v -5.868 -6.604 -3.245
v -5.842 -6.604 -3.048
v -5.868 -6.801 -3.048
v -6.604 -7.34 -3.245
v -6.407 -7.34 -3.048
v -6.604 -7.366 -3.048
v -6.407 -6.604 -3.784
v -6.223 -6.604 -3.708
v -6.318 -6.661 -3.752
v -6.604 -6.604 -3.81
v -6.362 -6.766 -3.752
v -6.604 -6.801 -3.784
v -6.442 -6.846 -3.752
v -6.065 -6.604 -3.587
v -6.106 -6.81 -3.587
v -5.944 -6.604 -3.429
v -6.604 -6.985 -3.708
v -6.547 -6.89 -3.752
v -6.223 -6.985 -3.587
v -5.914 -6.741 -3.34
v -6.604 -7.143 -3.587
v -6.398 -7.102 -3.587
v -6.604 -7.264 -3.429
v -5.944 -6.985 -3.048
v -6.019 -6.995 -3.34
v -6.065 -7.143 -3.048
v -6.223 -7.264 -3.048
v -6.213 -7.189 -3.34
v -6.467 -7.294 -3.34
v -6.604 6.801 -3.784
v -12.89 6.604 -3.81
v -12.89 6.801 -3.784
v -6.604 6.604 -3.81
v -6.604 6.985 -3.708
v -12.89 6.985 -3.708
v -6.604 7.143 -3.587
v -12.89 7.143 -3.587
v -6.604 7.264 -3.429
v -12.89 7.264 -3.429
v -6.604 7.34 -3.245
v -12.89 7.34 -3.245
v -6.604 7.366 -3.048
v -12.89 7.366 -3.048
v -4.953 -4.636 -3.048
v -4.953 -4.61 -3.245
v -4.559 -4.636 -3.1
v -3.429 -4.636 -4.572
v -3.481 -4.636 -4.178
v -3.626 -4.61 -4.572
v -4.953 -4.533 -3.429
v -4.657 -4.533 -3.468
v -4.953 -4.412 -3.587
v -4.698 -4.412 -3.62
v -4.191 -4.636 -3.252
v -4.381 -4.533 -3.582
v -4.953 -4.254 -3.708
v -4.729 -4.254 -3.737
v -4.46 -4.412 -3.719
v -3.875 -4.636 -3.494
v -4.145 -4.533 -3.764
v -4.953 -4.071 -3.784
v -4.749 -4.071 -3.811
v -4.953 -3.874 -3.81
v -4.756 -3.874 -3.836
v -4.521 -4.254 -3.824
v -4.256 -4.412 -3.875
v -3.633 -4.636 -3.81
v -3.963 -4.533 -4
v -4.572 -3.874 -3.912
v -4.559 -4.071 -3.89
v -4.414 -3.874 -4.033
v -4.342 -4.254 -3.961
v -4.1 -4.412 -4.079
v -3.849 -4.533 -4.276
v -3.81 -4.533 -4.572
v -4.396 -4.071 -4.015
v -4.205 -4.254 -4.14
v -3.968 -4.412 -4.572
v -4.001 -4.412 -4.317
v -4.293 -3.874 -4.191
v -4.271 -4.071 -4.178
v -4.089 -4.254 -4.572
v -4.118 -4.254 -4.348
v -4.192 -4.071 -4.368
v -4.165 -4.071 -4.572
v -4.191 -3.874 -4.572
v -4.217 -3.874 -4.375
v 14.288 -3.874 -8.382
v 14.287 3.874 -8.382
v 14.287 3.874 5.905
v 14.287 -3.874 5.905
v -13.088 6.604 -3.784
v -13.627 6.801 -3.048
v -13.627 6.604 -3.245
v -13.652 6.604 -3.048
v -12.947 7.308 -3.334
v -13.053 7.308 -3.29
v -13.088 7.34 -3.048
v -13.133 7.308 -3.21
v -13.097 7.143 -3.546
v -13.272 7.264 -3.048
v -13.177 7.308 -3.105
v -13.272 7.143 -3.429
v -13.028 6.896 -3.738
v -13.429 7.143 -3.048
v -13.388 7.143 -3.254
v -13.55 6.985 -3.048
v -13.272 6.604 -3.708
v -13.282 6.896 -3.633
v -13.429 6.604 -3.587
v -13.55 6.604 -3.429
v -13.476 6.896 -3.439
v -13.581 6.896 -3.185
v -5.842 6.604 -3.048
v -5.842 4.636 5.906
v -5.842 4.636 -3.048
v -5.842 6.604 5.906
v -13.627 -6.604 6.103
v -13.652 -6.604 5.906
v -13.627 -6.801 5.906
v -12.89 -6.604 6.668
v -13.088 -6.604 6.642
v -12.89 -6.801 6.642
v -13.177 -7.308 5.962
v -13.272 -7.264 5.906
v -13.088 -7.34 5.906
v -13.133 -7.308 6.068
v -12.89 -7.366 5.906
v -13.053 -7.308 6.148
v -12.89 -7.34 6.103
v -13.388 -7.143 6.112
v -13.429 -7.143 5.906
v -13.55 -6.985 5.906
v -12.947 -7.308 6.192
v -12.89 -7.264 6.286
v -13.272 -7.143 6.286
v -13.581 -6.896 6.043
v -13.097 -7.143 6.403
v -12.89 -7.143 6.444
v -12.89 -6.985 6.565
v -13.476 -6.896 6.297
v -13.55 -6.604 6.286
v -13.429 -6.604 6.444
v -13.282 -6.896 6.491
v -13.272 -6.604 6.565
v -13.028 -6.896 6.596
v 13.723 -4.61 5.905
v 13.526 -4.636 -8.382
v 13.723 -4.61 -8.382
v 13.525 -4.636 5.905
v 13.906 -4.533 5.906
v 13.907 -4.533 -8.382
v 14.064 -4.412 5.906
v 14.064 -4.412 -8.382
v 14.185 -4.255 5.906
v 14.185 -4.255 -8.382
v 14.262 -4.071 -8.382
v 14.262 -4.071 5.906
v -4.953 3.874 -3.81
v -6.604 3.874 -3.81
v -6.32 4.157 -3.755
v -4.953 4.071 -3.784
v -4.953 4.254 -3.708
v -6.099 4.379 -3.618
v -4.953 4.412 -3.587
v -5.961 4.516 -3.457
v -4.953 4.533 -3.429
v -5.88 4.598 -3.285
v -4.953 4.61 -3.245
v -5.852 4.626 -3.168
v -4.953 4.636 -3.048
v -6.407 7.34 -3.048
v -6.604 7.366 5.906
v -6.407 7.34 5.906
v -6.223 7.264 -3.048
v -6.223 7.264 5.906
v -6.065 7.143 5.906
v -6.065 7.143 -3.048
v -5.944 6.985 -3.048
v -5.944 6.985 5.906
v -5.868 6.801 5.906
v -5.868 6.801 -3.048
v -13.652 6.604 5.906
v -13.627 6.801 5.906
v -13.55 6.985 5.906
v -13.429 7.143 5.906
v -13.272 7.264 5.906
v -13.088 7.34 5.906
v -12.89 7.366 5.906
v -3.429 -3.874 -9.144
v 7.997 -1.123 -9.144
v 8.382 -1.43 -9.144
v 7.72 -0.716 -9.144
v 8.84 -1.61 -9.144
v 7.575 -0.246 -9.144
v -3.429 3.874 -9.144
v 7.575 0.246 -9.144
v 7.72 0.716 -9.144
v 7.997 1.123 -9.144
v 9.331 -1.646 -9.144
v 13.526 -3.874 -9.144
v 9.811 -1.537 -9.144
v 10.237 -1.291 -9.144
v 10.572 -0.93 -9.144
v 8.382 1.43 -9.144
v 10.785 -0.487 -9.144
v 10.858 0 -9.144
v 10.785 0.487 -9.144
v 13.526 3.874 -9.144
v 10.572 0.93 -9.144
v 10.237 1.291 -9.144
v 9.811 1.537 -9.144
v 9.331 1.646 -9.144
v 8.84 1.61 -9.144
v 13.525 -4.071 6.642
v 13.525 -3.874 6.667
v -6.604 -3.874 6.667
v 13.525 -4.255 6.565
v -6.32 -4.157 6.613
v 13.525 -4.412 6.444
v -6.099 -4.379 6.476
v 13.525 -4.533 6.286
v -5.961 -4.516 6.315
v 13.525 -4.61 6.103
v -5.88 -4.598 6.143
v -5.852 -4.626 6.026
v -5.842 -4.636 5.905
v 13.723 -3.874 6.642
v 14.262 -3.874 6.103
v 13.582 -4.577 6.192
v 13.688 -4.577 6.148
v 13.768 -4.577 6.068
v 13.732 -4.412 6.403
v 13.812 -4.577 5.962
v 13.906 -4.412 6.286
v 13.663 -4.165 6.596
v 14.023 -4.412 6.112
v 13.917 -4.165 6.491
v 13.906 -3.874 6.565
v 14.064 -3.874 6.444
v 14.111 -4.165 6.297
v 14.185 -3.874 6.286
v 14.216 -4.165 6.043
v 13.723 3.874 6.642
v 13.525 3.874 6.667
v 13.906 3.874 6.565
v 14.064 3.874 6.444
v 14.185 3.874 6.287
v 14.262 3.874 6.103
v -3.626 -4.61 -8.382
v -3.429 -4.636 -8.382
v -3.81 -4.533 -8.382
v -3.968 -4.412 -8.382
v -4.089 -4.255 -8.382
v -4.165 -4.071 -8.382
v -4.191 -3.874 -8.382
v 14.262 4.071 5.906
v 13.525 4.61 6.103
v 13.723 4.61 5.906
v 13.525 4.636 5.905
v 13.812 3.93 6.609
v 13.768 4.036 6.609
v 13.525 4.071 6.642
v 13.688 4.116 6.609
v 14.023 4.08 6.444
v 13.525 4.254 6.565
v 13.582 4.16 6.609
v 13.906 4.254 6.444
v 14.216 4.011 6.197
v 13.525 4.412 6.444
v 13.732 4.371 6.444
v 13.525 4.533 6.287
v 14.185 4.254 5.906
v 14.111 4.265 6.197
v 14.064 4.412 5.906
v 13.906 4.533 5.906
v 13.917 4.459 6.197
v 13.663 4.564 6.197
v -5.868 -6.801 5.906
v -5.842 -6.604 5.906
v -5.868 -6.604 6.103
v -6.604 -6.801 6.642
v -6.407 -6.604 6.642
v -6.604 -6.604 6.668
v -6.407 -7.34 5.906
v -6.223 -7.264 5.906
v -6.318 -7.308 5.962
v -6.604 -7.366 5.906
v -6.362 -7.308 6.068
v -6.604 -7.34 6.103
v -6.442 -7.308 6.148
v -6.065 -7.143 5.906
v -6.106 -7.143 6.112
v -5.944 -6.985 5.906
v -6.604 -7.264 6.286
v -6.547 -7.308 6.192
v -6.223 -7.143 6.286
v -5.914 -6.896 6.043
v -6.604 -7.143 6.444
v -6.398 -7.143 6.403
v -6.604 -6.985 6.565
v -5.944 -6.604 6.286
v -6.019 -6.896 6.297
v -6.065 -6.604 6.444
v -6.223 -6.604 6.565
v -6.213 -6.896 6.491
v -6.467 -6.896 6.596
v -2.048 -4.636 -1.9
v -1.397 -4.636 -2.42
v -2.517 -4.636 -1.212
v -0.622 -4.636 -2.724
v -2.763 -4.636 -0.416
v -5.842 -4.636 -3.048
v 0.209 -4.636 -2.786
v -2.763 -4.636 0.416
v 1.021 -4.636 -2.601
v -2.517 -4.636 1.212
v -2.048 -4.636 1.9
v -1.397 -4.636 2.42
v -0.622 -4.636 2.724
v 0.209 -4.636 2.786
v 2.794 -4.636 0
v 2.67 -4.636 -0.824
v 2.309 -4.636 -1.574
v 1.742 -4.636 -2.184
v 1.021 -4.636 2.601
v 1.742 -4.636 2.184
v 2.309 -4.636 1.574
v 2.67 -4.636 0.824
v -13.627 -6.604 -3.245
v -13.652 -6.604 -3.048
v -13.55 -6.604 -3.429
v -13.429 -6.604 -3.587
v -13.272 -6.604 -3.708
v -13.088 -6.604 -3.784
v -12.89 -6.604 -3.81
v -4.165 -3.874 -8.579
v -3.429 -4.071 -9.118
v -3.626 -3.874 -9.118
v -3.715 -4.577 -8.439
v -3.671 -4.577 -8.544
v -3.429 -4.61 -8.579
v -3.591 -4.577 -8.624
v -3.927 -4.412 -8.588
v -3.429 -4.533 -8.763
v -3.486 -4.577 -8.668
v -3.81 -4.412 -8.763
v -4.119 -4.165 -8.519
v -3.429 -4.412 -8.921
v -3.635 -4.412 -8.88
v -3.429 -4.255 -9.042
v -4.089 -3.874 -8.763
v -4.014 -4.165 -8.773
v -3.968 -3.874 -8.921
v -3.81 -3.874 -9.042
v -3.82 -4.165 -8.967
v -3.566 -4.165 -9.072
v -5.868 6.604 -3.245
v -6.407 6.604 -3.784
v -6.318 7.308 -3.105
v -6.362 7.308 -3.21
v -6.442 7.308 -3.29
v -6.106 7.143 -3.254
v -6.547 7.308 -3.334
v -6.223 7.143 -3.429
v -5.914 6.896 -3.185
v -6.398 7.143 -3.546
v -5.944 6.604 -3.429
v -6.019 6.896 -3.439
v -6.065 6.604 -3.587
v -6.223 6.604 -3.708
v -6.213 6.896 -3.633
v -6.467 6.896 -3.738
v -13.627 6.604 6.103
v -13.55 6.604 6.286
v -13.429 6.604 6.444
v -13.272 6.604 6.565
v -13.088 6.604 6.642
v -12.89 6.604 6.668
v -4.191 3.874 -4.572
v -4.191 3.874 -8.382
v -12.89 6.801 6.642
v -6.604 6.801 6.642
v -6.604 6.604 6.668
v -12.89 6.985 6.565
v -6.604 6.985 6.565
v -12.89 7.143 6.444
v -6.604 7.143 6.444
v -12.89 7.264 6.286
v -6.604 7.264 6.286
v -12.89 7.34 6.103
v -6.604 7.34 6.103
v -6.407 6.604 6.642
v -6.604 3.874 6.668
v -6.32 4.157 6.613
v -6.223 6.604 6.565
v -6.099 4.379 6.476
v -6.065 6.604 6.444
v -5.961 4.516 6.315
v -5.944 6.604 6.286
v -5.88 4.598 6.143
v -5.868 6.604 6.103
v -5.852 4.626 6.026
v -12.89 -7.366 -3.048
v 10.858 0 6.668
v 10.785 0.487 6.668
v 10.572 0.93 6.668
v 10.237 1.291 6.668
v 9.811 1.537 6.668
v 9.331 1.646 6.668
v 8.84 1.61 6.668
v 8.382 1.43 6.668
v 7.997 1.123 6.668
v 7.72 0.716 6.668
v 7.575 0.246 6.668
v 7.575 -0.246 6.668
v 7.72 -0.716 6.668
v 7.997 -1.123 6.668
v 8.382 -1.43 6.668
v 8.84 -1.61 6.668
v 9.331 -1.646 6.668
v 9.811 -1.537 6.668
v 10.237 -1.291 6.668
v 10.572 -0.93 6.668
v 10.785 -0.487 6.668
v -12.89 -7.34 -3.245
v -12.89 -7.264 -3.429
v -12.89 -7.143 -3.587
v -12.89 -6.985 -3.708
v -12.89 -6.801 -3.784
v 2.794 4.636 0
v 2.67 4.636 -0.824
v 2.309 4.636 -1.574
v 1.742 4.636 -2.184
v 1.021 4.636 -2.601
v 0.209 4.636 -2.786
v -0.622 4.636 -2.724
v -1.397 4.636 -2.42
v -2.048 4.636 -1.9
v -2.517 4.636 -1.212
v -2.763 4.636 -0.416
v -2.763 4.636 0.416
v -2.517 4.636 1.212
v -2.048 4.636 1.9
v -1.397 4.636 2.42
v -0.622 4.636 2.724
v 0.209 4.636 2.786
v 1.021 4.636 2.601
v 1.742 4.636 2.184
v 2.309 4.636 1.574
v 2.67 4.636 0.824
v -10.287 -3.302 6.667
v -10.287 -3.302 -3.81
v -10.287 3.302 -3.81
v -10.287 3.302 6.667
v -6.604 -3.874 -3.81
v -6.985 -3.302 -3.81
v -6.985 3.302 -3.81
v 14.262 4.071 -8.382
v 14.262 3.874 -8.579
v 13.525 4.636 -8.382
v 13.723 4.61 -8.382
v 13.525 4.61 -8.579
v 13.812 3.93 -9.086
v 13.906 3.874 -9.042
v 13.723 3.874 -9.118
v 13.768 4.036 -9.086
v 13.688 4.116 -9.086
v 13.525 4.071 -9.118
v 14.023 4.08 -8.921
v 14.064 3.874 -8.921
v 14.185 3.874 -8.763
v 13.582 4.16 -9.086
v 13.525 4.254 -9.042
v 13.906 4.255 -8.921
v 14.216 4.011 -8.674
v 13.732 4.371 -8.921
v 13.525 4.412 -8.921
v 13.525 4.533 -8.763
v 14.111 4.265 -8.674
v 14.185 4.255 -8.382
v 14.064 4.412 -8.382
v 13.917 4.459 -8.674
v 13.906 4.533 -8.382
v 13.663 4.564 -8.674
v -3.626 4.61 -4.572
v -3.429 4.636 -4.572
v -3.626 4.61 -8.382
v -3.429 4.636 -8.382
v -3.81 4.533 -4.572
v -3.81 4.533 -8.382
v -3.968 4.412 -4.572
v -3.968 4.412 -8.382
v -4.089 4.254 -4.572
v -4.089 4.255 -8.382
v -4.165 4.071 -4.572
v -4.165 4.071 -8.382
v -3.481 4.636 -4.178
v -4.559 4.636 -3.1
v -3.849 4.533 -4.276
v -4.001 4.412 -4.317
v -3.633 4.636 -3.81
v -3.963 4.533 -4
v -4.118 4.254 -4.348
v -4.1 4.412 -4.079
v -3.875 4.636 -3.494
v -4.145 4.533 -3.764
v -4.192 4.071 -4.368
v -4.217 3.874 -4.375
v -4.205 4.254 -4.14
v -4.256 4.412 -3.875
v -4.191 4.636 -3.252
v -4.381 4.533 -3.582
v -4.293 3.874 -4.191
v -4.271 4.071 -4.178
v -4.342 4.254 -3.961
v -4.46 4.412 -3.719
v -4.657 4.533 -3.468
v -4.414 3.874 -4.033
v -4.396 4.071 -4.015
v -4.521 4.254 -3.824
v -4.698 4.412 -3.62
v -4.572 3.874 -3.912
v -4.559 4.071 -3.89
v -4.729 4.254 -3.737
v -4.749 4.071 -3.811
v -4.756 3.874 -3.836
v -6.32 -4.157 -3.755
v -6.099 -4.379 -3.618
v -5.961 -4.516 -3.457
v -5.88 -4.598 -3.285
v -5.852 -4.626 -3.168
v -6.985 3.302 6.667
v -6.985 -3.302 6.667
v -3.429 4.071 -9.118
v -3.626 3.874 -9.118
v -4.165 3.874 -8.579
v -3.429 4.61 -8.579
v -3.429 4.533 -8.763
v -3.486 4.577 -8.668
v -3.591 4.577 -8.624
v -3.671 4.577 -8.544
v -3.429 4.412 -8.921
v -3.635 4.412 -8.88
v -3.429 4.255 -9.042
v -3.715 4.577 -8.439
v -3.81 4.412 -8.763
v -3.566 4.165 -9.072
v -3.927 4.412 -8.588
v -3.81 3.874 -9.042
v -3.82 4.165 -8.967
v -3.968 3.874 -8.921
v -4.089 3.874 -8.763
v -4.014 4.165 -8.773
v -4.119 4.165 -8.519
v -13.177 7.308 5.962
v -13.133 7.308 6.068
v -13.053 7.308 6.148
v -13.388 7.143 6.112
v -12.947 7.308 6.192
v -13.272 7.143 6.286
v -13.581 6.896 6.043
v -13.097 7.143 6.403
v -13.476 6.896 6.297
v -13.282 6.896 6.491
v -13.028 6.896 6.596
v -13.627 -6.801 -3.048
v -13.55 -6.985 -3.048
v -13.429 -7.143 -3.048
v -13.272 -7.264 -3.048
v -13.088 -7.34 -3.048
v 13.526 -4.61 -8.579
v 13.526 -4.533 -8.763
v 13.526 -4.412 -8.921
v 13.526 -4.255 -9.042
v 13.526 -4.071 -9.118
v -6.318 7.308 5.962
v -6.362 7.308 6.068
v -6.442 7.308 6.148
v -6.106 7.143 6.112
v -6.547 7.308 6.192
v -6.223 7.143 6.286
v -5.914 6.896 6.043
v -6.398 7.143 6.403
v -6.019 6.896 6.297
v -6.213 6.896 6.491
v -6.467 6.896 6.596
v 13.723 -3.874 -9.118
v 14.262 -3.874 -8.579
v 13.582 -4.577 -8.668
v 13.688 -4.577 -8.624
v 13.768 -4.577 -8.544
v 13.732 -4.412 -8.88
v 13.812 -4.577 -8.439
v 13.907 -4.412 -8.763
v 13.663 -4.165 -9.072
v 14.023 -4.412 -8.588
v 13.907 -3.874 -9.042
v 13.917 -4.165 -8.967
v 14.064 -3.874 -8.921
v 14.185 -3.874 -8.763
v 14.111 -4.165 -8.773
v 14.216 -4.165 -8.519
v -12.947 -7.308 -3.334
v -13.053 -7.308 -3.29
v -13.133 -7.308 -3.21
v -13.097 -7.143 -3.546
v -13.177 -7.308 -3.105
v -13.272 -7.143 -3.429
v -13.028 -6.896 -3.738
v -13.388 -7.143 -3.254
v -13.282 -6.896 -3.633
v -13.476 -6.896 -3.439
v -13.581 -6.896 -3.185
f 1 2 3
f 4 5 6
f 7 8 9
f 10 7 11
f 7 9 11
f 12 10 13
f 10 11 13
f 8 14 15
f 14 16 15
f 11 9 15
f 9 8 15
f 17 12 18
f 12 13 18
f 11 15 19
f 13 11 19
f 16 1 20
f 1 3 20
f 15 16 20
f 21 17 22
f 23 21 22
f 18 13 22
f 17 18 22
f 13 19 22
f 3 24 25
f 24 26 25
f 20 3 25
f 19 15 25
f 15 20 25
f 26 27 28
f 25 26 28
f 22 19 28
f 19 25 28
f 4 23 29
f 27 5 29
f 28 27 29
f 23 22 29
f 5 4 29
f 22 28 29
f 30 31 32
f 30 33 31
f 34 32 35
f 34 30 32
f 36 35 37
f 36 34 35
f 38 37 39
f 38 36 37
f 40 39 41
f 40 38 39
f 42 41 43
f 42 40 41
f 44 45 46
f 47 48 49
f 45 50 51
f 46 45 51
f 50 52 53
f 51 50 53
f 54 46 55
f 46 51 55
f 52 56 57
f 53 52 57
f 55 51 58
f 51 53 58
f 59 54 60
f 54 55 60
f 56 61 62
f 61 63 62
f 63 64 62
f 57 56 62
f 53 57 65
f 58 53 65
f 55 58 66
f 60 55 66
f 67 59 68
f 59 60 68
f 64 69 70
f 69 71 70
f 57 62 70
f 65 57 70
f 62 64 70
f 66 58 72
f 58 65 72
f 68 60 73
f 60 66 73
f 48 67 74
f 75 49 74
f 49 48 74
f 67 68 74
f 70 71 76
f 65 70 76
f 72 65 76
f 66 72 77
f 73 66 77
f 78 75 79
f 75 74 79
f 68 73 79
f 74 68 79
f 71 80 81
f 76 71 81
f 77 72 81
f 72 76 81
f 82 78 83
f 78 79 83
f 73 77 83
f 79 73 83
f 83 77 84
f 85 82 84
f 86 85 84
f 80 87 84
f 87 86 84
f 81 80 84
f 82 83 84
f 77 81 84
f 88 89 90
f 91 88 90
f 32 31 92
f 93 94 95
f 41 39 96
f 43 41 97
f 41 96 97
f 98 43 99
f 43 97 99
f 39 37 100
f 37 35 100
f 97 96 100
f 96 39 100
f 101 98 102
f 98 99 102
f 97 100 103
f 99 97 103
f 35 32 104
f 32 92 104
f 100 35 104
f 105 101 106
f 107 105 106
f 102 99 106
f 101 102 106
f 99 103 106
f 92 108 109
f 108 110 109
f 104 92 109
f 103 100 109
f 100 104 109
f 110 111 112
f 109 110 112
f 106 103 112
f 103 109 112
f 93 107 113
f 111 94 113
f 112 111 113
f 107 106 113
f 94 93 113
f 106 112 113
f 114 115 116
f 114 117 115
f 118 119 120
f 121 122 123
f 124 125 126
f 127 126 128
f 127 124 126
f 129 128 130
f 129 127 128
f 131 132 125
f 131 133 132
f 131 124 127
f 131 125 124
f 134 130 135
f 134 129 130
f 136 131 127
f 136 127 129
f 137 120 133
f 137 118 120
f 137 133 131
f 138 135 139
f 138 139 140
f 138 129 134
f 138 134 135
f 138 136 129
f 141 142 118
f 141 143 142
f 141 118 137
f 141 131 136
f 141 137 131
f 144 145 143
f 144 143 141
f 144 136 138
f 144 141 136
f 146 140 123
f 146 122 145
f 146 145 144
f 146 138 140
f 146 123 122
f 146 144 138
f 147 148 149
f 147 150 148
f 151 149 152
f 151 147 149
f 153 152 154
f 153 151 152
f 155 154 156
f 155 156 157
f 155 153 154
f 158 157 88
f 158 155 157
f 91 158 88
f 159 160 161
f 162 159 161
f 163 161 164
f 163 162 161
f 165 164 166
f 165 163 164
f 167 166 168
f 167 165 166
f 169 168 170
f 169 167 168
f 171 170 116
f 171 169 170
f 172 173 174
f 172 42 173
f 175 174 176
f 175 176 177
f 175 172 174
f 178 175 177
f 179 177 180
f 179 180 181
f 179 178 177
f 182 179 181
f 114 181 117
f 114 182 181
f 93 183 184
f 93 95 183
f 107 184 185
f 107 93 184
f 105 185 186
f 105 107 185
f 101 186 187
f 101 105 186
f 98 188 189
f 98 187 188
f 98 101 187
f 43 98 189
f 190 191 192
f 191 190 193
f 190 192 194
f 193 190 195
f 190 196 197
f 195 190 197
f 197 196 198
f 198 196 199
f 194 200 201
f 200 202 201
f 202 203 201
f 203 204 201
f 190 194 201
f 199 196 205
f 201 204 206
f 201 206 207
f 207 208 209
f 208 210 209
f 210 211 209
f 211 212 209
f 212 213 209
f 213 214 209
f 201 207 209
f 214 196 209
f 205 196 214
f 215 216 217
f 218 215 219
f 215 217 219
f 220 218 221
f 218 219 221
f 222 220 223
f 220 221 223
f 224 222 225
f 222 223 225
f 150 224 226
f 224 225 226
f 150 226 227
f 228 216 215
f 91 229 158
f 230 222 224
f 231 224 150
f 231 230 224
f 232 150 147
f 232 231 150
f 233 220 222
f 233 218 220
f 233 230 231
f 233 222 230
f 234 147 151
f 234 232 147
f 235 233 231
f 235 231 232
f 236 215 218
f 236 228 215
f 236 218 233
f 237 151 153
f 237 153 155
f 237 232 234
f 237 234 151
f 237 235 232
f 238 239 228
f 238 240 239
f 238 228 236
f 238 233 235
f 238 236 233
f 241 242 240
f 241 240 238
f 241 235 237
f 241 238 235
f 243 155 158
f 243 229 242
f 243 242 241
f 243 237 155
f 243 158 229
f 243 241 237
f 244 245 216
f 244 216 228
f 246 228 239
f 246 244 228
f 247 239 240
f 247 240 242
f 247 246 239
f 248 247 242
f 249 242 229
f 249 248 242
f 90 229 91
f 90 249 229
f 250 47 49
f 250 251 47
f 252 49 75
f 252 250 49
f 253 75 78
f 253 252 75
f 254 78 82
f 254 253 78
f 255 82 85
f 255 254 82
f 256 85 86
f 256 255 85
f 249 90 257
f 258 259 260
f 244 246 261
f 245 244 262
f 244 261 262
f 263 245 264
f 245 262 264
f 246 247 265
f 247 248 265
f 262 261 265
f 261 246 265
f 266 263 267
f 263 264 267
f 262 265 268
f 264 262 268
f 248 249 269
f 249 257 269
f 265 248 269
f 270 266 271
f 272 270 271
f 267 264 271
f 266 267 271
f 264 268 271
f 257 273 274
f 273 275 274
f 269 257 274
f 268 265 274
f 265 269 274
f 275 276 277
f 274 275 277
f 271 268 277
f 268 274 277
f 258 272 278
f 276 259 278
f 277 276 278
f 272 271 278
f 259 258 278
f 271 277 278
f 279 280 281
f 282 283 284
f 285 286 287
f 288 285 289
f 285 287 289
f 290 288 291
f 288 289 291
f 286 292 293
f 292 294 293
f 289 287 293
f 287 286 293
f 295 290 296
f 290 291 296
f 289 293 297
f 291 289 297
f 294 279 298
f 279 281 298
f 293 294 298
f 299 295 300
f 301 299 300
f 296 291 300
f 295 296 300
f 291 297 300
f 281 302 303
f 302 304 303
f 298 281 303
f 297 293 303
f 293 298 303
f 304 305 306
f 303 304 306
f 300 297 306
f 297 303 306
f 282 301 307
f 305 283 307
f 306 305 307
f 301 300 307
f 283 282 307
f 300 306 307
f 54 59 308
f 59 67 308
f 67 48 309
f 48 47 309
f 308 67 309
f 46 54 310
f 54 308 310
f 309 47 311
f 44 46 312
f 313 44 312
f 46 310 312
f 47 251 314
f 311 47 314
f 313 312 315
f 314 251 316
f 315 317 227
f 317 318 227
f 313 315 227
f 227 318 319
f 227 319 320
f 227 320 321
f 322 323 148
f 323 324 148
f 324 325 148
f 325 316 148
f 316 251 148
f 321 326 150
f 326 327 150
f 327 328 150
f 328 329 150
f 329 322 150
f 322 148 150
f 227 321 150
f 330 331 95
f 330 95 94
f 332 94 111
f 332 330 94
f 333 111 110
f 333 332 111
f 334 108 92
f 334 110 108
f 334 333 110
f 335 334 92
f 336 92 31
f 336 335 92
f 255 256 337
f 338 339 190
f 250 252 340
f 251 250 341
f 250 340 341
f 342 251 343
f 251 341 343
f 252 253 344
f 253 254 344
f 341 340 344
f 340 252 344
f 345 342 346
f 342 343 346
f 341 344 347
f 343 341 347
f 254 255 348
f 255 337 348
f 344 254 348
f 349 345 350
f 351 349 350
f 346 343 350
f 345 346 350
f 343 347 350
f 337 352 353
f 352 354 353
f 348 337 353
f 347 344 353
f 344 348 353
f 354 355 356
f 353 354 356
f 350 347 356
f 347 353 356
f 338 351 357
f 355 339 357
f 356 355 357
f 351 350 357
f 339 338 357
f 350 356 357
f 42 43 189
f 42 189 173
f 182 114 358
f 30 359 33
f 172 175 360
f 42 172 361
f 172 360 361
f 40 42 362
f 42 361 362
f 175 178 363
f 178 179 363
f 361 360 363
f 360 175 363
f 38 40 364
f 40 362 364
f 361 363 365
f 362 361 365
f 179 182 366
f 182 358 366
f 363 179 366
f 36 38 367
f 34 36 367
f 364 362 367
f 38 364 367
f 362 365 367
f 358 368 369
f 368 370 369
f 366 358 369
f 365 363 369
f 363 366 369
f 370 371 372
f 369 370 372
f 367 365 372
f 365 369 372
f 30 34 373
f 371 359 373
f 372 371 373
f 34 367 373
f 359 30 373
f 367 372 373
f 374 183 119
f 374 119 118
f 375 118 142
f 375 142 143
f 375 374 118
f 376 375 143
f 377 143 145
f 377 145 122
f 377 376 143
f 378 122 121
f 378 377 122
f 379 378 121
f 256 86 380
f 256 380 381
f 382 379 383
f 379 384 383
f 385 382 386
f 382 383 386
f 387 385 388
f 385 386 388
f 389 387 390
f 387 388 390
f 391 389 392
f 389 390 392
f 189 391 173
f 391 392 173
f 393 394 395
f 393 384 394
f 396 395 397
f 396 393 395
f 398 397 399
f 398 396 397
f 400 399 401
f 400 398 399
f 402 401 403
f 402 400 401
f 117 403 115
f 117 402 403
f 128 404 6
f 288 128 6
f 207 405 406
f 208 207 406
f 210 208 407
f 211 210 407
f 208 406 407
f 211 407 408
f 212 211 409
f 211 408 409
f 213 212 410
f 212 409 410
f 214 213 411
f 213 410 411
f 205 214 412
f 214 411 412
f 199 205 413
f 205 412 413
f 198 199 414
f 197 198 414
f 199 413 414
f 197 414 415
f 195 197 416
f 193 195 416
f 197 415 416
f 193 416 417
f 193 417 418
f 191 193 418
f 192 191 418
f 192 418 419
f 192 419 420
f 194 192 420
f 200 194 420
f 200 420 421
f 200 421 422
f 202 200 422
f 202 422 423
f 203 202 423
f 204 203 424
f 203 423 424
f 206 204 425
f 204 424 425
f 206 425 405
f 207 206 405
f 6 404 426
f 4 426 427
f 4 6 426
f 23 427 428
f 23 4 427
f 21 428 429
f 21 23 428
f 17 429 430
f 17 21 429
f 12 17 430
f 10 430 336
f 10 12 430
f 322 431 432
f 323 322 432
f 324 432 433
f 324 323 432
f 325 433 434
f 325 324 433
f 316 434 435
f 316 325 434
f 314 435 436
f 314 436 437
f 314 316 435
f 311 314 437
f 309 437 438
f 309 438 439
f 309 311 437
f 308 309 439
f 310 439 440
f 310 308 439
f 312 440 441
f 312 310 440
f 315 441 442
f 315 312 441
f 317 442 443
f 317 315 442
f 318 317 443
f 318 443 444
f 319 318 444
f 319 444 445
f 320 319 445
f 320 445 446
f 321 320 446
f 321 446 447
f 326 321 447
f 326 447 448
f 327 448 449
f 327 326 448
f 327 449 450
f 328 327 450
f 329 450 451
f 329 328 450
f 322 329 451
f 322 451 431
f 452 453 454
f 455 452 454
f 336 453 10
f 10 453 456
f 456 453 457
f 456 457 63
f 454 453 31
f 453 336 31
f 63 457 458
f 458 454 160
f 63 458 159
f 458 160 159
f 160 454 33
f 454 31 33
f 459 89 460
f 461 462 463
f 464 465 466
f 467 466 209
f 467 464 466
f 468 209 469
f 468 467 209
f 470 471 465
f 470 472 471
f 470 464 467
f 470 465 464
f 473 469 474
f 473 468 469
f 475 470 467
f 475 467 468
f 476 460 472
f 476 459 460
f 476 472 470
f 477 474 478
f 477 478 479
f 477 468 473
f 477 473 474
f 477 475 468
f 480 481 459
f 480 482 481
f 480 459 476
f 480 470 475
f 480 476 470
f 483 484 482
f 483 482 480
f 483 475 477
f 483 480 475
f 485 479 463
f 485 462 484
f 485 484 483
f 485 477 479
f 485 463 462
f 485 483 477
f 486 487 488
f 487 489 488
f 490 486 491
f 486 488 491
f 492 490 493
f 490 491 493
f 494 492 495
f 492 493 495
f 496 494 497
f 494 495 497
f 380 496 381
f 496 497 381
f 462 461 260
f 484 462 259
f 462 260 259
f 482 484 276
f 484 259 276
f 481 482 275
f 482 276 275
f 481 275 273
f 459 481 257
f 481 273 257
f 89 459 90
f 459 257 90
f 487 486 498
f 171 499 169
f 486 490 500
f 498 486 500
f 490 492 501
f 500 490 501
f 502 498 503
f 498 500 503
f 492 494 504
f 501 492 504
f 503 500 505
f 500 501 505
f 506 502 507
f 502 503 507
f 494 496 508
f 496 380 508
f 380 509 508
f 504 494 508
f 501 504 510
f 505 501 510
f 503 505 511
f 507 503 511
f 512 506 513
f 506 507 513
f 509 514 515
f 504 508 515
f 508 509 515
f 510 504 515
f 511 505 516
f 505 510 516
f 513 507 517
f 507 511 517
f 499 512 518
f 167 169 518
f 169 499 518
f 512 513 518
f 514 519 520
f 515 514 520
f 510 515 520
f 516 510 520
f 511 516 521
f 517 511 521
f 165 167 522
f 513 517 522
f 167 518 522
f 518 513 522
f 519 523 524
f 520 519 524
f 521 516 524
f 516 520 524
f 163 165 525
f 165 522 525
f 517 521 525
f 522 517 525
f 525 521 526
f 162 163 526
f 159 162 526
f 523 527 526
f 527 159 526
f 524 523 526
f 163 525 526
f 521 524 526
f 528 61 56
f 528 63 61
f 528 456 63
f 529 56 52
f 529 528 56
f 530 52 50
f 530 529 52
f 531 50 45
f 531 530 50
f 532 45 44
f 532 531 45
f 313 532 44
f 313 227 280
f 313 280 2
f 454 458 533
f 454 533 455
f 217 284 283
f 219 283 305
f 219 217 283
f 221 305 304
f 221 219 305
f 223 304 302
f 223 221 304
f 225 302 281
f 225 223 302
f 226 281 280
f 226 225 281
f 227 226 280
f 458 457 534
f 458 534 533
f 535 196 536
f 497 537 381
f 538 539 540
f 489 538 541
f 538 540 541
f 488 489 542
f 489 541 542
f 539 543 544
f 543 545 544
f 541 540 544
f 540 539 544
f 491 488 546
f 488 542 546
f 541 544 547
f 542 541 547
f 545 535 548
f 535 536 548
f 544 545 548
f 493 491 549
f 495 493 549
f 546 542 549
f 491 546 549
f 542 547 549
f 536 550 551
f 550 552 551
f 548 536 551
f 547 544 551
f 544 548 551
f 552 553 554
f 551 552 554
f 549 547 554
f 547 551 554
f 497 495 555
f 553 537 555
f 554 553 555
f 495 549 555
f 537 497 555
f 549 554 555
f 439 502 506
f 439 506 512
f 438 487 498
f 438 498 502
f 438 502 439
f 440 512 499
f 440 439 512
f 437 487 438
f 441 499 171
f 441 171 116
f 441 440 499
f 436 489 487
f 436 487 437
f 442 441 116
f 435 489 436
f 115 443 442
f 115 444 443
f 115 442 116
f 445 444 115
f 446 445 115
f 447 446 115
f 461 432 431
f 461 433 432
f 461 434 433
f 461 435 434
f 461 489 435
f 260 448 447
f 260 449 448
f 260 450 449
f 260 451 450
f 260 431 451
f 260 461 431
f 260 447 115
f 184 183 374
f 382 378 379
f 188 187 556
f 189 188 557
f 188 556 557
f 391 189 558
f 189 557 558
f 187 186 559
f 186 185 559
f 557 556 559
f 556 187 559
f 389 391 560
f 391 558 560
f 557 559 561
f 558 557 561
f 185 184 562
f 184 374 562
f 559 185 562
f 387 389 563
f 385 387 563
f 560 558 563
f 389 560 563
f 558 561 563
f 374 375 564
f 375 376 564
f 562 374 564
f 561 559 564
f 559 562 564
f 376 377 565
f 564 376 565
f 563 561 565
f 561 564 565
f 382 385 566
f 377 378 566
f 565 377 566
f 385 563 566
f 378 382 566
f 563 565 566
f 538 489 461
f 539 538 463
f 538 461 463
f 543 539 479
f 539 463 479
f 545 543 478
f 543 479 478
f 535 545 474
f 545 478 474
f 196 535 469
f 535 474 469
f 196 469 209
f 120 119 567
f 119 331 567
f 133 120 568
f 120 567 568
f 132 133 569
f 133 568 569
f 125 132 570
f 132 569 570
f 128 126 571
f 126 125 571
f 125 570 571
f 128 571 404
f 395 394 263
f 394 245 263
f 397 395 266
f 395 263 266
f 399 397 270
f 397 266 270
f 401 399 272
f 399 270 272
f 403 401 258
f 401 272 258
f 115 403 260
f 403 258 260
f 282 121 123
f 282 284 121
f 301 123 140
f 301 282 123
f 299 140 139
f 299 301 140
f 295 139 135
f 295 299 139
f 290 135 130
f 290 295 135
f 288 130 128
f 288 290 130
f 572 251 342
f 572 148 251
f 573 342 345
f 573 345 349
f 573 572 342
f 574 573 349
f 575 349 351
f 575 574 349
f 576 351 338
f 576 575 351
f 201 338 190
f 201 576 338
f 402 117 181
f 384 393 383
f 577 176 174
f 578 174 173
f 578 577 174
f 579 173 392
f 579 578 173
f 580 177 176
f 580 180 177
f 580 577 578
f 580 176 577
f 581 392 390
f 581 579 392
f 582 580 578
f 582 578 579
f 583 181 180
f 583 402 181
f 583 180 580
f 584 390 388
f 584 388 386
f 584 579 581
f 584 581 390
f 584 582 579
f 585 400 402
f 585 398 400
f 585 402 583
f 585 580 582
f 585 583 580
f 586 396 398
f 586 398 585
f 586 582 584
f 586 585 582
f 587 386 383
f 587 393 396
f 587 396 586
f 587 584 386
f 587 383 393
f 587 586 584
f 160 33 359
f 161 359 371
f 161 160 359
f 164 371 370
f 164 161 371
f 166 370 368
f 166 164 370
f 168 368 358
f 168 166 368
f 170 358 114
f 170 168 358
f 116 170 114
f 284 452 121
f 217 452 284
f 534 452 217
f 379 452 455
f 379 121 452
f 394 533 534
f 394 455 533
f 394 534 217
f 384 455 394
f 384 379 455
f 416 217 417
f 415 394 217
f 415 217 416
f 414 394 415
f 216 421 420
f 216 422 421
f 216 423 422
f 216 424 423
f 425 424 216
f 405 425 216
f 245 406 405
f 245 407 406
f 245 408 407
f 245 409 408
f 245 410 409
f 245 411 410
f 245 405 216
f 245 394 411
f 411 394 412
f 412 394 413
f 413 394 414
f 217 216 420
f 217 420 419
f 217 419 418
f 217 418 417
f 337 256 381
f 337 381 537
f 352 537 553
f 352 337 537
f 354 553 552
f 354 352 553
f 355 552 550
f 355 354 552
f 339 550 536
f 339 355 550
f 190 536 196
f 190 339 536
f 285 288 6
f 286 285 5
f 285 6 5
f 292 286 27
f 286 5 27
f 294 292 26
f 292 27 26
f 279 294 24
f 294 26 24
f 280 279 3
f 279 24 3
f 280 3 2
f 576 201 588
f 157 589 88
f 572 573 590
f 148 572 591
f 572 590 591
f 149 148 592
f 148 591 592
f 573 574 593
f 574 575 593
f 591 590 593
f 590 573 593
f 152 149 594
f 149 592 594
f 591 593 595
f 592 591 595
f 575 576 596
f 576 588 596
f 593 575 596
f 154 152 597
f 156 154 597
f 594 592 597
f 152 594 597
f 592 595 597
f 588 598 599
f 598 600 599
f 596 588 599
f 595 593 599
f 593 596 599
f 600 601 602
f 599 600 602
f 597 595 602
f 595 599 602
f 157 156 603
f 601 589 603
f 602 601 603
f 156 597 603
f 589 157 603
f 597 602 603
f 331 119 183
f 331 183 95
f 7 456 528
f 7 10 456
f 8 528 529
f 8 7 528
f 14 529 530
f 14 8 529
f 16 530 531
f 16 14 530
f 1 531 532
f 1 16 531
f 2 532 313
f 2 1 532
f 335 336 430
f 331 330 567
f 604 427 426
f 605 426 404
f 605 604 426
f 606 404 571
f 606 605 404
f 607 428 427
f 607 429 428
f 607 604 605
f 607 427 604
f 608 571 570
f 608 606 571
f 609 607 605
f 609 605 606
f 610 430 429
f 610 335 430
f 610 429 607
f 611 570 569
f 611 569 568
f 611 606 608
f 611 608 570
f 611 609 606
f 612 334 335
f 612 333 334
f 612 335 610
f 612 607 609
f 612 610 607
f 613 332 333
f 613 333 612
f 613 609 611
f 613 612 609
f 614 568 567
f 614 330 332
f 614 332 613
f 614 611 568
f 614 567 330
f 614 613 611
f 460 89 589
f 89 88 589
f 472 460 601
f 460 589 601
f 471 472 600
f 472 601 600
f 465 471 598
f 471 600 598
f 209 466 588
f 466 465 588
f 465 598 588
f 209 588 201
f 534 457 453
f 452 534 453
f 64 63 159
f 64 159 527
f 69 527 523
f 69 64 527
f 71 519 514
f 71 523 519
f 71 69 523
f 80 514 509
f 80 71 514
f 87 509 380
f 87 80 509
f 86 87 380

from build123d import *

# Parameters (mm, degrees)
SKETCH1_R           = 2.794
BOSS_EXTRUDE1_DEPTH = 4.6355
SKETCH2_W           = 10.4775
SKETCH2_H           = 9.271
BOSS_EXTRUDE2_DEPTH = 2.54
SKETCH3_W           = 7.8105
SKETCH3_H           = 10.4775
BOSS_EXTRUDE3_DEPTH = 7.366
SKETCH4_W           = 3.302
SKETCH4_H           = 6.604
CUT_EXTRUDE1_DEPTH  = 10.4775
SKETCH5_R           = 1.651
CUT_EXTRUDE2_DEPTH  = 15.8115
FILLET1_R           = 0.762


with BuildPart() as part:
    # Sketch1 → Boss-Extrude1 (new body, symmetric)
    with BuildSketch(Plane(origin=(0, 0, 0), x_dir=(1, 0, 0), z_dir=(0, 1, 0))):
        Polygon((-11.1125, 3.81), (-4.191, 3.81), (-4.191, 9.144), (14.2875, 9.144), (14.2875, -6.6675), (-11.1125, -6.6675), align=None)
        Circle(SKETCH1_R, mode=Mode.SUBTRACT)
    extrude(amount=BOSS_EXTRUDE1_DEPTH, both=True)

    # Sketch2 → Boss-Extrude2 (add)
    with BuildSketch(Plane.ZY.offset(11.1125)):
        with Locations((1.42875, 0)):
            Rectangle(SKETCH2_W, SKETCH2_H)
    extrude(amount=BOSS_EXTRUDE2_DEPTH)

    # Sketch3 → Boss-Extrude3 (add, symmetric)
    with BuildSketch(Plane(origin=(0, 0, 0), x_dir=(1, 0, 0), z_dir=(0, 1, 0))):
        with Locations((-9.74725, -1.42875)):
            Rectangle(SKETCH3_W, SKETCH3_H)
    extrude(amount=BOSS_EXTRUDE3_DEPTH, both=True)

    # Sketch4 → Cut-Extrude1 (cut)
    with BuildSketch(Plane(origin=(0, 0, -3.81), x_dir=(-1, 0, 0), z_dir=(0, 0, -1))):
        with Locations((8.636, 0)):
            Rectangle(SKETCH4_W, SKETCH4_H)
    extrude(amount=-CUT_EXTRUDE1_DEPTH, mode=Mode.SUBTRACT)

    # Sketch5 → Cut-Extrude2 (cut)
    with BuildSketch(Plane.XY.offset(6.6675)):
        with Locations((9.2075, 0)):
            Circle(SKETCH5_R)
    extrude(amount=-CUT_EXTRUDE2_DEPTH, mode=Mode.SUBTRACT)

    # Fillet1
    fillet1_edges = [part.edges().sort_by_distance(p)[0] for p in [
        (14.2875, 4.6355, -1.23825),
        (-4.191, 0, -3.81),
        (-4.191, 0, -9.144),
        (14.2875, 0, -9.144),
        (14.2875, 0, 6.6675),
        (5.04825, 4.6355, -9.144),
        (-4.191, 4.6355, -6.477),
        (-5.0165, 4.6355, -3.81),
        (-13.6525, 0, -3.81),
        (-13.6525, 0, 6.6675),
        (4.22275, -4.6355, 6.6675),
        (4.22275, 4.6355, 6.6675),
        (-5.842, 6.00075, 6.6675),
        (-5.842, 6.00075, -3.81),
        (-5.842, -6.00075, 6.6675),
        (-5.842, -7.366, 1.42875),
        (-5.842, -6.00075, -3.81),
        (-9.74725, -7.366, -3.81),
        (-13.6525, -7.366, 1.42875),
        (-9.74725, -7.366, 6.6675),
        (-5.842, 7.366, 1.42875),
        (-9.74725, 7.366, -3.81),
        (-13.6525, 7.366, 1.42875),
        (-9.74725, 7.366, 6.6675),
        (-5.0165, -4.6355, -3.81),
        (-4.191, -4.6355, -6.477),
        (5.04825, -4.6355, -9.144),
        (14.2875, -4.6355, -1.23825),
    ]]
    fillet(fillet1_edges, radius=FILLET1_R)


solid = part.part
